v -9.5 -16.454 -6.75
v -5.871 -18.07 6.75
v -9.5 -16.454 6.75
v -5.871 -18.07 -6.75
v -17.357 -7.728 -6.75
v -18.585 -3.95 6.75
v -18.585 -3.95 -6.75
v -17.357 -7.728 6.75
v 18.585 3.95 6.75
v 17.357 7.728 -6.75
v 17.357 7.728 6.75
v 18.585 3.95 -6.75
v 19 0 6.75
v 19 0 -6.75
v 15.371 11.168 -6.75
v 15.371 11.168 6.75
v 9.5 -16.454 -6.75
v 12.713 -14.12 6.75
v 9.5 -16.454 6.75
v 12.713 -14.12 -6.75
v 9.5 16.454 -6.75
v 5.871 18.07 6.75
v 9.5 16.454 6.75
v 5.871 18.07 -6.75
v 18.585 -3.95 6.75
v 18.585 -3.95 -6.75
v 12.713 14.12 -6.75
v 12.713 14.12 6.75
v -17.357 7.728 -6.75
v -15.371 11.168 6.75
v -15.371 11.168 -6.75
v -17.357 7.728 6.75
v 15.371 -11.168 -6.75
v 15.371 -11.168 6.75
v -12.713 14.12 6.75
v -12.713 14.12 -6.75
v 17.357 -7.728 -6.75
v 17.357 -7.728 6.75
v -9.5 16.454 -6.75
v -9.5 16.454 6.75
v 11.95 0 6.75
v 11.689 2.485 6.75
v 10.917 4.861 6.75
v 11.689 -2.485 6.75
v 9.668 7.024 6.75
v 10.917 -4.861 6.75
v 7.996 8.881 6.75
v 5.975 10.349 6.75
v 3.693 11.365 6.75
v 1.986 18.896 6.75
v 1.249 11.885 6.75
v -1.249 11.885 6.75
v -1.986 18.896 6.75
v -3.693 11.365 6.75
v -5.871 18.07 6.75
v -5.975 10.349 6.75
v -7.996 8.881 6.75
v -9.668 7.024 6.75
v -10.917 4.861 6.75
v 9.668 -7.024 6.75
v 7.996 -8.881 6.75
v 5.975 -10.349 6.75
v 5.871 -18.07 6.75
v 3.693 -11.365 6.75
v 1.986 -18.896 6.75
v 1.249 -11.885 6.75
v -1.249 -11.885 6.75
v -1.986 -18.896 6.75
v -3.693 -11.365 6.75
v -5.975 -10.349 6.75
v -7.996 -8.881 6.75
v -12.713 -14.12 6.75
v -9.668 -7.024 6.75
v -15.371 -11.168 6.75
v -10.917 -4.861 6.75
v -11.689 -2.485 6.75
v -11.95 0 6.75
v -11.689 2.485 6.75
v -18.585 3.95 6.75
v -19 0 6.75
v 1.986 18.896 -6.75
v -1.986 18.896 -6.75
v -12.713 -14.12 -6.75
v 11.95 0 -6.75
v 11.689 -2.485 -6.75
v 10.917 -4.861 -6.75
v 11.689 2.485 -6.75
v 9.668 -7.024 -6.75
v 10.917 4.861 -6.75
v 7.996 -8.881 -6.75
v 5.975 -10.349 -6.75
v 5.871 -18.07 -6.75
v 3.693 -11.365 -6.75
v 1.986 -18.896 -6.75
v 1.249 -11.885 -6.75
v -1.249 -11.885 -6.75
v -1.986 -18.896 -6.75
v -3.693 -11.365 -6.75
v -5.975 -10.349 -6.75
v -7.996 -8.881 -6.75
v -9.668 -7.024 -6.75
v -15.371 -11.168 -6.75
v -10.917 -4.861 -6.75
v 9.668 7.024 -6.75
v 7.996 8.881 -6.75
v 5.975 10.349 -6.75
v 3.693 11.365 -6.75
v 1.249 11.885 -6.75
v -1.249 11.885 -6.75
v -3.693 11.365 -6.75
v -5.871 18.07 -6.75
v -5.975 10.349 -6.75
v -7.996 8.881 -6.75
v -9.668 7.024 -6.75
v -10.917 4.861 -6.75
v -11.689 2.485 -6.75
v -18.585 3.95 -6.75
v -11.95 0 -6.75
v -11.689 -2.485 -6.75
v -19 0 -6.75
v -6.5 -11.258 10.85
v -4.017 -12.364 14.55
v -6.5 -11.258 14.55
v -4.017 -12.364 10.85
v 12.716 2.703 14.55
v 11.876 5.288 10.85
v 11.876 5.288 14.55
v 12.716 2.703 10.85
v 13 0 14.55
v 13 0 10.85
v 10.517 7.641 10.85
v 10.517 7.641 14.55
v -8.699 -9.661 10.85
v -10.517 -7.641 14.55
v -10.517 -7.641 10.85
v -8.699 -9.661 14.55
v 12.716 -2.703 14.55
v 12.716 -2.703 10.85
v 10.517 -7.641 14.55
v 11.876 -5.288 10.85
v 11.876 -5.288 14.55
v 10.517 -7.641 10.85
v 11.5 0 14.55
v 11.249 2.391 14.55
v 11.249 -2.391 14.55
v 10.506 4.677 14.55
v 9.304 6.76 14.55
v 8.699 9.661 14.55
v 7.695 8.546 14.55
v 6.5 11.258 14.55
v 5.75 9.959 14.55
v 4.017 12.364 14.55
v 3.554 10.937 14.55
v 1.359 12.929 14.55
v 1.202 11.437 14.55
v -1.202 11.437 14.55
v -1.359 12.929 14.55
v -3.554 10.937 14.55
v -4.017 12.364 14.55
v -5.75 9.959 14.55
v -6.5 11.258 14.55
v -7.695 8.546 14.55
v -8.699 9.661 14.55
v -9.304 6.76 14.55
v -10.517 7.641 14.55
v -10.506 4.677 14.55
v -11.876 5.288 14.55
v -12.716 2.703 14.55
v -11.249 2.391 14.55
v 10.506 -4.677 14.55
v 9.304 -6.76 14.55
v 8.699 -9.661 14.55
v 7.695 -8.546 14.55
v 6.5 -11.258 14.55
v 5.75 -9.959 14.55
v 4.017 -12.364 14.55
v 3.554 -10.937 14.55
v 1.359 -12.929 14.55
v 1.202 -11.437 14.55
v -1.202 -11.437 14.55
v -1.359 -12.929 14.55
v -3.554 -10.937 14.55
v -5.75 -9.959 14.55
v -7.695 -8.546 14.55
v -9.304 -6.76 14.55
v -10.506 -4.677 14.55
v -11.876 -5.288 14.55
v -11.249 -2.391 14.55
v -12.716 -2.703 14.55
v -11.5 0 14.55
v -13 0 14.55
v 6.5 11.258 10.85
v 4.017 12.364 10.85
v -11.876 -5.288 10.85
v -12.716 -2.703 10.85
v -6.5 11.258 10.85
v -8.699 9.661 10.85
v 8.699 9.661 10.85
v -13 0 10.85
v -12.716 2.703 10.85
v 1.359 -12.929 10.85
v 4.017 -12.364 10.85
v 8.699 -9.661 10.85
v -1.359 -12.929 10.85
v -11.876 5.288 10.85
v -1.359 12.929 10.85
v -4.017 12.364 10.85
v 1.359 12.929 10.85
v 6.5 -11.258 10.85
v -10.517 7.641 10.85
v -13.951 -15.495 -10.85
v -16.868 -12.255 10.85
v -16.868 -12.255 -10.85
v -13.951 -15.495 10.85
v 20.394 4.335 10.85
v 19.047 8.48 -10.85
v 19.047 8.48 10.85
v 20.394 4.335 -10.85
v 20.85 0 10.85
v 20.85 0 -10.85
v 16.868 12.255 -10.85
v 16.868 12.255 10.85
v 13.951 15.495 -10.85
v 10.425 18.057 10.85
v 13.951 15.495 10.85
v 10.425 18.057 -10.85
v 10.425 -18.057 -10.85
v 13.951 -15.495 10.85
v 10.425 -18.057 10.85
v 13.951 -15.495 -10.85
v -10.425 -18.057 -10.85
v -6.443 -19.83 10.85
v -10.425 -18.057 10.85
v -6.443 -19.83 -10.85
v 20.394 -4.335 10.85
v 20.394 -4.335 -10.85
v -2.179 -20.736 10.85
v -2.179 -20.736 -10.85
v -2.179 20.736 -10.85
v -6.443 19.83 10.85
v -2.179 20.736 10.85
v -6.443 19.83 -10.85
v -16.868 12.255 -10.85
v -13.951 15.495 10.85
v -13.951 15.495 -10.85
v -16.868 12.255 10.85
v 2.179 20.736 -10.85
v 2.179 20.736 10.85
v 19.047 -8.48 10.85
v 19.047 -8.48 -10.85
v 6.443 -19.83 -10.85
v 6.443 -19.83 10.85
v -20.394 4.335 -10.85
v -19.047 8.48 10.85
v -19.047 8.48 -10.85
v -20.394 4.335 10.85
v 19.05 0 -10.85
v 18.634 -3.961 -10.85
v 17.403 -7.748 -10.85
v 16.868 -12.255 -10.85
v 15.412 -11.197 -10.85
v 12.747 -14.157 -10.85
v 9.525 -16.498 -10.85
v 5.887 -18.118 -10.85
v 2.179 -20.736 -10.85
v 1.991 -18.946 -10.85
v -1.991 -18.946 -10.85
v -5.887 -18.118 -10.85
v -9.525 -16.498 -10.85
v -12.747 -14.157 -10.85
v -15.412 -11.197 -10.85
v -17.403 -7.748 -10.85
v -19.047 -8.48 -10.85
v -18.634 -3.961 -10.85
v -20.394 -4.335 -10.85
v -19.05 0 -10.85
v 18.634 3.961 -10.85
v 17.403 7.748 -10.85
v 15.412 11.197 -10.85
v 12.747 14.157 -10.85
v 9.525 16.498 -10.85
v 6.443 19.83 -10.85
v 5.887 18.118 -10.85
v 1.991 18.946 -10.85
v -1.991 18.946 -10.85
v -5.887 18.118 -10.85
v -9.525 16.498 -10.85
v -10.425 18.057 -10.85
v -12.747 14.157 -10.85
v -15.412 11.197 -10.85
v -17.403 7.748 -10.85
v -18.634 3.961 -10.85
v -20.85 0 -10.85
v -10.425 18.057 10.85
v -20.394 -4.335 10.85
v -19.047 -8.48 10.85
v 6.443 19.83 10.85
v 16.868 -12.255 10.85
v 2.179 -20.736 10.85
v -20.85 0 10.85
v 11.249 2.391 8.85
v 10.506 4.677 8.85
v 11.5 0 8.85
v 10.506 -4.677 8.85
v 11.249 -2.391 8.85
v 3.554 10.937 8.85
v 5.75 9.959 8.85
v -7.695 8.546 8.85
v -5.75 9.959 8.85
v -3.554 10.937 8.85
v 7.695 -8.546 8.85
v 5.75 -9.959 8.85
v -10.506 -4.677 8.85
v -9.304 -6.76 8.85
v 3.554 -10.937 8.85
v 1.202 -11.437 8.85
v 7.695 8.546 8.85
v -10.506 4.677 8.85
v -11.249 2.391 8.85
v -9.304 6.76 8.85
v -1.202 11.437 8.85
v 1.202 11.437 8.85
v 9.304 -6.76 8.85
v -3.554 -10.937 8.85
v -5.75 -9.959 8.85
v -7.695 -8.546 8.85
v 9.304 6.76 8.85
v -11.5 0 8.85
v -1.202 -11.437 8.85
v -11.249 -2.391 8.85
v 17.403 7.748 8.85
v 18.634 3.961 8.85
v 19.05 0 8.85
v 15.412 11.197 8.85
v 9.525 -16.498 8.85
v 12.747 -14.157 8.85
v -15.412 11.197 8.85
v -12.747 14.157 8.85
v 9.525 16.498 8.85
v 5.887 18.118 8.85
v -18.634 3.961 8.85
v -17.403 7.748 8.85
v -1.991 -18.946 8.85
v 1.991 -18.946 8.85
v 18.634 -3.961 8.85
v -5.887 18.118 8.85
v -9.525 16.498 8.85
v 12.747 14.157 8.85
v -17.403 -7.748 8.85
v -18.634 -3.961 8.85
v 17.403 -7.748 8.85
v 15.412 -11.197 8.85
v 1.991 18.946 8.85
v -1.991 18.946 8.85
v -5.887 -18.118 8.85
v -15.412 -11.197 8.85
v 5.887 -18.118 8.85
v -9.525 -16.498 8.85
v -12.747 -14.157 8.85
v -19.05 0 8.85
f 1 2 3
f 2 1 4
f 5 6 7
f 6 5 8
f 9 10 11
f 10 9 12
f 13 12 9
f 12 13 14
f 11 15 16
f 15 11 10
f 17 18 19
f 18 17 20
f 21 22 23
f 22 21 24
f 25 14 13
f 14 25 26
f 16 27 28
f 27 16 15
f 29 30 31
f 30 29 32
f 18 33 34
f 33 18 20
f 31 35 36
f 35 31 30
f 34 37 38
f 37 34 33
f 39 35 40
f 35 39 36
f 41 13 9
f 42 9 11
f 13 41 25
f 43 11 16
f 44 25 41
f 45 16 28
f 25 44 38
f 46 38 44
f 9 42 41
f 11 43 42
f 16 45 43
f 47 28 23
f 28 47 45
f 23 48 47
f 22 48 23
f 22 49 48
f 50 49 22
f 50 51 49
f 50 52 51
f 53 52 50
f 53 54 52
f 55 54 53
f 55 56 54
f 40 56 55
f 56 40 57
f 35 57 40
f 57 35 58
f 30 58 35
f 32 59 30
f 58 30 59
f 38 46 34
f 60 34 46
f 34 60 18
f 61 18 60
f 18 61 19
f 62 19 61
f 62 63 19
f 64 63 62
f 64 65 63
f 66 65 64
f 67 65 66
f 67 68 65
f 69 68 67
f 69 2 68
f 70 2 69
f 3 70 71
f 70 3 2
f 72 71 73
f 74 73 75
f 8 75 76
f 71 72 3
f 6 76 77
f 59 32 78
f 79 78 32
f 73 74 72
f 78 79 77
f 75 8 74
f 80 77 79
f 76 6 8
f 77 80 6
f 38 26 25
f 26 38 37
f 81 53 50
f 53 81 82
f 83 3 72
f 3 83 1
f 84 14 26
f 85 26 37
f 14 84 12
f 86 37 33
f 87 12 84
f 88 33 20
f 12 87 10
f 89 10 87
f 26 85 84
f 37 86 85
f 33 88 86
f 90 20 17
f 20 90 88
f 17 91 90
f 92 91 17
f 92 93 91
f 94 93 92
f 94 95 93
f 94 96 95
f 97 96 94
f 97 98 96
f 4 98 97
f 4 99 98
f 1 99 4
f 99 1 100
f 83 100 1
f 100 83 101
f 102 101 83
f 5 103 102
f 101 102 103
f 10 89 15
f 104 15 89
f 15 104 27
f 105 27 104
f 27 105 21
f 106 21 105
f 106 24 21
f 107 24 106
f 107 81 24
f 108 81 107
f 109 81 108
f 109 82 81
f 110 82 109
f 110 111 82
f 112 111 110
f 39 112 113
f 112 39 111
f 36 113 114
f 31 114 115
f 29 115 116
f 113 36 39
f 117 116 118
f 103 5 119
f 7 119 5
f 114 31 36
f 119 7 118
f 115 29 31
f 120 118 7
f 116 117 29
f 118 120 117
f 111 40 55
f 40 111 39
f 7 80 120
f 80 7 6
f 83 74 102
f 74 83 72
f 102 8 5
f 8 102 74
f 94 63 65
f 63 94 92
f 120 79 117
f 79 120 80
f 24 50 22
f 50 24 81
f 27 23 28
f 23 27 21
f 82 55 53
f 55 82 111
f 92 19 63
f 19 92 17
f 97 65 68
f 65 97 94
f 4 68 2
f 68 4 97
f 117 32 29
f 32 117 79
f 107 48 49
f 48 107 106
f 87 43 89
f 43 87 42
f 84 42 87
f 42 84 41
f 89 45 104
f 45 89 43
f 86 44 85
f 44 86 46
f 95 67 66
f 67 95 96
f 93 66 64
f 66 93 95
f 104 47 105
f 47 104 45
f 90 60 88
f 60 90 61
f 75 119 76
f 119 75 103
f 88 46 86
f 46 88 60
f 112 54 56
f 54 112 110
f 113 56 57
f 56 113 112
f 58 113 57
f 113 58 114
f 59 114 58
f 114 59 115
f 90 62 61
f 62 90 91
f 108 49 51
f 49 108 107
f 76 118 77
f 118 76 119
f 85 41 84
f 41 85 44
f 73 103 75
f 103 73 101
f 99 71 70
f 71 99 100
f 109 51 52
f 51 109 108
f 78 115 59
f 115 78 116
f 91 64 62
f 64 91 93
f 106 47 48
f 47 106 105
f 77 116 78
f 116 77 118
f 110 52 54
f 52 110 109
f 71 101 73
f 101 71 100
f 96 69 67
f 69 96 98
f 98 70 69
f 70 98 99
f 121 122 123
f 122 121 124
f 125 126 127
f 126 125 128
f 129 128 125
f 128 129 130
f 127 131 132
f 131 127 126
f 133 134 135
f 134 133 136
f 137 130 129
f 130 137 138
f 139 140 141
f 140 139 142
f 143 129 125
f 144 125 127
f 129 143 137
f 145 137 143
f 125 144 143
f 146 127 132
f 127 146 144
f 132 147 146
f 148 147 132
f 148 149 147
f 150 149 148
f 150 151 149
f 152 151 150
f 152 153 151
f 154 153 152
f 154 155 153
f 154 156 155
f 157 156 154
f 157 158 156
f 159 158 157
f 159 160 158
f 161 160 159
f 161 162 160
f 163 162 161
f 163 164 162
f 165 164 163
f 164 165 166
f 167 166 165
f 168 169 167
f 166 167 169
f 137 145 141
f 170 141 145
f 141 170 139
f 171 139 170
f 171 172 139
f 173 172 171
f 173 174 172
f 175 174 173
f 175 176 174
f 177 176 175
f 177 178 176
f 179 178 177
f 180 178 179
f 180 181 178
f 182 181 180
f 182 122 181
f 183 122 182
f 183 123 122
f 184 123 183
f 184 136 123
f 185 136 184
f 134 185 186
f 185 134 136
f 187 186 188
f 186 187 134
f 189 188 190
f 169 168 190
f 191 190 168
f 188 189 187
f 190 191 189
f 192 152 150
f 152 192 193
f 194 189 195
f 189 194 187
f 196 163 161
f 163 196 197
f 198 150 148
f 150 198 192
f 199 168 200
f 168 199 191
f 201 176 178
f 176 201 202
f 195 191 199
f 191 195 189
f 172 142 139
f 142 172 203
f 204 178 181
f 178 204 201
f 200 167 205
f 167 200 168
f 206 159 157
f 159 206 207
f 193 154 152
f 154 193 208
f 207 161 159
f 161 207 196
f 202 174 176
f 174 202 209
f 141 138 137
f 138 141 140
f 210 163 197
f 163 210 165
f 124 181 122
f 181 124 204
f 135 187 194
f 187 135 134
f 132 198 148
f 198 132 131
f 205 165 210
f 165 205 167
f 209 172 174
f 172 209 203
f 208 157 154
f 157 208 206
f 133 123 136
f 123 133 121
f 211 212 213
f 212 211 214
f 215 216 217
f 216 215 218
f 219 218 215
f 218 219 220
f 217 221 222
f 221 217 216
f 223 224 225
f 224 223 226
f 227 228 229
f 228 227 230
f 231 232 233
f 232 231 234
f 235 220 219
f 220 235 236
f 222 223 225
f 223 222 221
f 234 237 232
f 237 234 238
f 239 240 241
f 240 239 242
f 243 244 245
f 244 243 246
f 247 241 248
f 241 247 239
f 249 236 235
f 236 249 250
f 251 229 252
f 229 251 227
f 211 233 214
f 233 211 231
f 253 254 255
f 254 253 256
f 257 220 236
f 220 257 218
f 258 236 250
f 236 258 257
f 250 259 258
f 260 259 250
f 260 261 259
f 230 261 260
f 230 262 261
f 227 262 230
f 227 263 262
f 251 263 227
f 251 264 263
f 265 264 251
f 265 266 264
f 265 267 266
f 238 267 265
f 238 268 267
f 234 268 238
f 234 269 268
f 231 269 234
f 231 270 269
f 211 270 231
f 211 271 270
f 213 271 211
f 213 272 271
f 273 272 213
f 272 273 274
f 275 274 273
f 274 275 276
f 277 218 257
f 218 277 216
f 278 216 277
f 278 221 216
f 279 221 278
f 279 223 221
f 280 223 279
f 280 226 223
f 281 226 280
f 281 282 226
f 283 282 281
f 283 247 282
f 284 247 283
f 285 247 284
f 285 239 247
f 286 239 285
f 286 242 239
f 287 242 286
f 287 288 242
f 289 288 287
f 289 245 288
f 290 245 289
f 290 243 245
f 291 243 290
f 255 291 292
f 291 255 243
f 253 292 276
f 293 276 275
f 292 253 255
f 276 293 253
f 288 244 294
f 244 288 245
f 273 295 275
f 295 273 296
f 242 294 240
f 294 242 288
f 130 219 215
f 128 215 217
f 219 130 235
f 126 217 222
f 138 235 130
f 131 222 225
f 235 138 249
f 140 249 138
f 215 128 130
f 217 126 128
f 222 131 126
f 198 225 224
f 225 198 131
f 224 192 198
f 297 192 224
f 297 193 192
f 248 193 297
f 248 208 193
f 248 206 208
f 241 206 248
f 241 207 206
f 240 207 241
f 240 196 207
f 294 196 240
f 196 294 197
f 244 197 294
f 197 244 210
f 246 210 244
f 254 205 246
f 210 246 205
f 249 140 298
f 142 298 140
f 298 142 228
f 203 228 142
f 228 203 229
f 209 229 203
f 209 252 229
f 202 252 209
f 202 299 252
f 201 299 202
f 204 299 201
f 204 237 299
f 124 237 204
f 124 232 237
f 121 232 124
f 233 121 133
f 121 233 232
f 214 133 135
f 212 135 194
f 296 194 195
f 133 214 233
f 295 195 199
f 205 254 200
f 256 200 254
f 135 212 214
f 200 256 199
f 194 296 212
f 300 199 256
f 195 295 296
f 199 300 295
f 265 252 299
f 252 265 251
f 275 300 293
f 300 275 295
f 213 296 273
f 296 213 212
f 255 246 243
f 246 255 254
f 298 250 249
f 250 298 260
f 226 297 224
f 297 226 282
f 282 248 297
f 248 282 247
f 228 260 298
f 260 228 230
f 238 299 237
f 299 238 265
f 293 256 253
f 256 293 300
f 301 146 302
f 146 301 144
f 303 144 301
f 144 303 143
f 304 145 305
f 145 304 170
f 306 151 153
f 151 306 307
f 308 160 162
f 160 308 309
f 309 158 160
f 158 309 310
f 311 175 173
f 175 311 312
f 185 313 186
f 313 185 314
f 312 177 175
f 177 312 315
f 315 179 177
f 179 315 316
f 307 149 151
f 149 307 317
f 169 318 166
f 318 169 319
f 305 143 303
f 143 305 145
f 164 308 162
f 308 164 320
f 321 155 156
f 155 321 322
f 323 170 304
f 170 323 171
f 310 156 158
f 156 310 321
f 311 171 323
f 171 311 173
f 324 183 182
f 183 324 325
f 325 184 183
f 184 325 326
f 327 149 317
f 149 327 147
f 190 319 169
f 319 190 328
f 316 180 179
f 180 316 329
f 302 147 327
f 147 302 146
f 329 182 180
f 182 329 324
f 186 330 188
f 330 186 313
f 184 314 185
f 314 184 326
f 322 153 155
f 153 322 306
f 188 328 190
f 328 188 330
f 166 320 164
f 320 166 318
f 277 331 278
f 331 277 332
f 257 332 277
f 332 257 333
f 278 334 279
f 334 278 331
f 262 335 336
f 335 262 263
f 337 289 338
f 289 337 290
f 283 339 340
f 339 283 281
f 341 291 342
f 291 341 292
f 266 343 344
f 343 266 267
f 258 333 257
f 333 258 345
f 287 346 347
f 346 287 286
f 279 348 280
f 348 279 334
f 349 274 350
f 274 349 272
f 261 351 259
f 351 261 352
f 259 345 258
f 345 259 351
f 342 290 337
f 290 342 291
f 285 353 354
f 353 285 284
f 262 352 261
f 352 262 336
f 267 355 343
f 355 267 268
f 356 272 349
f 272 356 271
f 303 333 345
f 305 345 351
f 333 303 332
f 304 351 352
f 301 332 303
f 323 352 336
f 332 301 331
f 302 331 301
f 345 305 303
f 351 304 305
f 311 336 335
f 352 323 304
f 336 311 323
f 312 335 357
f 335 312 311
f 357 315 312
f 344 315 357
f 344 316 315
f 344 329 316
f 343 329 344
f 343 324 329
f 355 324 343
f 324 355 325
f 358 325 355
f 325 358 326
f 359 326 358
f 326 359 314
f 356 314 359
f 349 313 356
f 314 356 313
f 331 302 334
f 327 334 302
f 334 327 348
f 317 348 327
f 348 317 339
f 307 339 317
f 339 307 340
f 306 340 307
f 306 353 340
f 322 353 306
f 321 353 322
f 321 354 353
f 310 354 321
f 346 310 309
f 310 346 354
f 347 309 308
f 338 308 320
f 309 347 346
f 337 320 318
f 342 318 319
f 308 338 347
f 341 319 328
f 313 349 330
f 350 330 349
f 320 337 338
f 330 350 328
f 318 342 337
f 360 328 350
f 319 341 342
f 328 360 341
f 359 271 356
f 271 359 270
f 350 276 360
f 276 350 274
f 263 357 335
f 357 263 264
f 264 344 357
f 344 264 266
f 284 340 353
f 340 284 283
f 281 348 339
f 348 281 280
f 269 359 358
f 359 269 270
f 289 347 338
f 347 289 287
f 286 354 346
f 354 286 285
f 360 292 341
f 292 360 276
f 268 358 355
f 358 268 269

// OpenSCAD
module inner_barrel(phi_in=23.9, phi_out=38, hh=13.5){
     difference(){
          cylinder(d=phi_out, h=hh, center=true);
          cylinder(d=phi_in, h=hh+0.4, center=true);
     }
}

module outer_barrel(phi_in1=38.1, phi_out1=41.7, h1=21.7, phi_out2=26, h2=3.6, phi_in2=23){

     difference(){
          union(){
               translate([0, 0, (h1+h2)/2])
                    cylinder(d=phi_out2, h=h2+0.2, center=true);
               cylinder(d=phi_out1, h=h1, center=true);
          }
          union(){
               translate([0, 0, (h1+h2)/2])
                    cylinder(d=phi_in2, h=h2+5, center=true);
               translate([0, 0, -2]) cylinder(d=phi_in1, h=h1, center=true);
          }
     }
}



module mock_focus(){
     inner_barrel();
     outer_barrel();
}

mock_focus();
